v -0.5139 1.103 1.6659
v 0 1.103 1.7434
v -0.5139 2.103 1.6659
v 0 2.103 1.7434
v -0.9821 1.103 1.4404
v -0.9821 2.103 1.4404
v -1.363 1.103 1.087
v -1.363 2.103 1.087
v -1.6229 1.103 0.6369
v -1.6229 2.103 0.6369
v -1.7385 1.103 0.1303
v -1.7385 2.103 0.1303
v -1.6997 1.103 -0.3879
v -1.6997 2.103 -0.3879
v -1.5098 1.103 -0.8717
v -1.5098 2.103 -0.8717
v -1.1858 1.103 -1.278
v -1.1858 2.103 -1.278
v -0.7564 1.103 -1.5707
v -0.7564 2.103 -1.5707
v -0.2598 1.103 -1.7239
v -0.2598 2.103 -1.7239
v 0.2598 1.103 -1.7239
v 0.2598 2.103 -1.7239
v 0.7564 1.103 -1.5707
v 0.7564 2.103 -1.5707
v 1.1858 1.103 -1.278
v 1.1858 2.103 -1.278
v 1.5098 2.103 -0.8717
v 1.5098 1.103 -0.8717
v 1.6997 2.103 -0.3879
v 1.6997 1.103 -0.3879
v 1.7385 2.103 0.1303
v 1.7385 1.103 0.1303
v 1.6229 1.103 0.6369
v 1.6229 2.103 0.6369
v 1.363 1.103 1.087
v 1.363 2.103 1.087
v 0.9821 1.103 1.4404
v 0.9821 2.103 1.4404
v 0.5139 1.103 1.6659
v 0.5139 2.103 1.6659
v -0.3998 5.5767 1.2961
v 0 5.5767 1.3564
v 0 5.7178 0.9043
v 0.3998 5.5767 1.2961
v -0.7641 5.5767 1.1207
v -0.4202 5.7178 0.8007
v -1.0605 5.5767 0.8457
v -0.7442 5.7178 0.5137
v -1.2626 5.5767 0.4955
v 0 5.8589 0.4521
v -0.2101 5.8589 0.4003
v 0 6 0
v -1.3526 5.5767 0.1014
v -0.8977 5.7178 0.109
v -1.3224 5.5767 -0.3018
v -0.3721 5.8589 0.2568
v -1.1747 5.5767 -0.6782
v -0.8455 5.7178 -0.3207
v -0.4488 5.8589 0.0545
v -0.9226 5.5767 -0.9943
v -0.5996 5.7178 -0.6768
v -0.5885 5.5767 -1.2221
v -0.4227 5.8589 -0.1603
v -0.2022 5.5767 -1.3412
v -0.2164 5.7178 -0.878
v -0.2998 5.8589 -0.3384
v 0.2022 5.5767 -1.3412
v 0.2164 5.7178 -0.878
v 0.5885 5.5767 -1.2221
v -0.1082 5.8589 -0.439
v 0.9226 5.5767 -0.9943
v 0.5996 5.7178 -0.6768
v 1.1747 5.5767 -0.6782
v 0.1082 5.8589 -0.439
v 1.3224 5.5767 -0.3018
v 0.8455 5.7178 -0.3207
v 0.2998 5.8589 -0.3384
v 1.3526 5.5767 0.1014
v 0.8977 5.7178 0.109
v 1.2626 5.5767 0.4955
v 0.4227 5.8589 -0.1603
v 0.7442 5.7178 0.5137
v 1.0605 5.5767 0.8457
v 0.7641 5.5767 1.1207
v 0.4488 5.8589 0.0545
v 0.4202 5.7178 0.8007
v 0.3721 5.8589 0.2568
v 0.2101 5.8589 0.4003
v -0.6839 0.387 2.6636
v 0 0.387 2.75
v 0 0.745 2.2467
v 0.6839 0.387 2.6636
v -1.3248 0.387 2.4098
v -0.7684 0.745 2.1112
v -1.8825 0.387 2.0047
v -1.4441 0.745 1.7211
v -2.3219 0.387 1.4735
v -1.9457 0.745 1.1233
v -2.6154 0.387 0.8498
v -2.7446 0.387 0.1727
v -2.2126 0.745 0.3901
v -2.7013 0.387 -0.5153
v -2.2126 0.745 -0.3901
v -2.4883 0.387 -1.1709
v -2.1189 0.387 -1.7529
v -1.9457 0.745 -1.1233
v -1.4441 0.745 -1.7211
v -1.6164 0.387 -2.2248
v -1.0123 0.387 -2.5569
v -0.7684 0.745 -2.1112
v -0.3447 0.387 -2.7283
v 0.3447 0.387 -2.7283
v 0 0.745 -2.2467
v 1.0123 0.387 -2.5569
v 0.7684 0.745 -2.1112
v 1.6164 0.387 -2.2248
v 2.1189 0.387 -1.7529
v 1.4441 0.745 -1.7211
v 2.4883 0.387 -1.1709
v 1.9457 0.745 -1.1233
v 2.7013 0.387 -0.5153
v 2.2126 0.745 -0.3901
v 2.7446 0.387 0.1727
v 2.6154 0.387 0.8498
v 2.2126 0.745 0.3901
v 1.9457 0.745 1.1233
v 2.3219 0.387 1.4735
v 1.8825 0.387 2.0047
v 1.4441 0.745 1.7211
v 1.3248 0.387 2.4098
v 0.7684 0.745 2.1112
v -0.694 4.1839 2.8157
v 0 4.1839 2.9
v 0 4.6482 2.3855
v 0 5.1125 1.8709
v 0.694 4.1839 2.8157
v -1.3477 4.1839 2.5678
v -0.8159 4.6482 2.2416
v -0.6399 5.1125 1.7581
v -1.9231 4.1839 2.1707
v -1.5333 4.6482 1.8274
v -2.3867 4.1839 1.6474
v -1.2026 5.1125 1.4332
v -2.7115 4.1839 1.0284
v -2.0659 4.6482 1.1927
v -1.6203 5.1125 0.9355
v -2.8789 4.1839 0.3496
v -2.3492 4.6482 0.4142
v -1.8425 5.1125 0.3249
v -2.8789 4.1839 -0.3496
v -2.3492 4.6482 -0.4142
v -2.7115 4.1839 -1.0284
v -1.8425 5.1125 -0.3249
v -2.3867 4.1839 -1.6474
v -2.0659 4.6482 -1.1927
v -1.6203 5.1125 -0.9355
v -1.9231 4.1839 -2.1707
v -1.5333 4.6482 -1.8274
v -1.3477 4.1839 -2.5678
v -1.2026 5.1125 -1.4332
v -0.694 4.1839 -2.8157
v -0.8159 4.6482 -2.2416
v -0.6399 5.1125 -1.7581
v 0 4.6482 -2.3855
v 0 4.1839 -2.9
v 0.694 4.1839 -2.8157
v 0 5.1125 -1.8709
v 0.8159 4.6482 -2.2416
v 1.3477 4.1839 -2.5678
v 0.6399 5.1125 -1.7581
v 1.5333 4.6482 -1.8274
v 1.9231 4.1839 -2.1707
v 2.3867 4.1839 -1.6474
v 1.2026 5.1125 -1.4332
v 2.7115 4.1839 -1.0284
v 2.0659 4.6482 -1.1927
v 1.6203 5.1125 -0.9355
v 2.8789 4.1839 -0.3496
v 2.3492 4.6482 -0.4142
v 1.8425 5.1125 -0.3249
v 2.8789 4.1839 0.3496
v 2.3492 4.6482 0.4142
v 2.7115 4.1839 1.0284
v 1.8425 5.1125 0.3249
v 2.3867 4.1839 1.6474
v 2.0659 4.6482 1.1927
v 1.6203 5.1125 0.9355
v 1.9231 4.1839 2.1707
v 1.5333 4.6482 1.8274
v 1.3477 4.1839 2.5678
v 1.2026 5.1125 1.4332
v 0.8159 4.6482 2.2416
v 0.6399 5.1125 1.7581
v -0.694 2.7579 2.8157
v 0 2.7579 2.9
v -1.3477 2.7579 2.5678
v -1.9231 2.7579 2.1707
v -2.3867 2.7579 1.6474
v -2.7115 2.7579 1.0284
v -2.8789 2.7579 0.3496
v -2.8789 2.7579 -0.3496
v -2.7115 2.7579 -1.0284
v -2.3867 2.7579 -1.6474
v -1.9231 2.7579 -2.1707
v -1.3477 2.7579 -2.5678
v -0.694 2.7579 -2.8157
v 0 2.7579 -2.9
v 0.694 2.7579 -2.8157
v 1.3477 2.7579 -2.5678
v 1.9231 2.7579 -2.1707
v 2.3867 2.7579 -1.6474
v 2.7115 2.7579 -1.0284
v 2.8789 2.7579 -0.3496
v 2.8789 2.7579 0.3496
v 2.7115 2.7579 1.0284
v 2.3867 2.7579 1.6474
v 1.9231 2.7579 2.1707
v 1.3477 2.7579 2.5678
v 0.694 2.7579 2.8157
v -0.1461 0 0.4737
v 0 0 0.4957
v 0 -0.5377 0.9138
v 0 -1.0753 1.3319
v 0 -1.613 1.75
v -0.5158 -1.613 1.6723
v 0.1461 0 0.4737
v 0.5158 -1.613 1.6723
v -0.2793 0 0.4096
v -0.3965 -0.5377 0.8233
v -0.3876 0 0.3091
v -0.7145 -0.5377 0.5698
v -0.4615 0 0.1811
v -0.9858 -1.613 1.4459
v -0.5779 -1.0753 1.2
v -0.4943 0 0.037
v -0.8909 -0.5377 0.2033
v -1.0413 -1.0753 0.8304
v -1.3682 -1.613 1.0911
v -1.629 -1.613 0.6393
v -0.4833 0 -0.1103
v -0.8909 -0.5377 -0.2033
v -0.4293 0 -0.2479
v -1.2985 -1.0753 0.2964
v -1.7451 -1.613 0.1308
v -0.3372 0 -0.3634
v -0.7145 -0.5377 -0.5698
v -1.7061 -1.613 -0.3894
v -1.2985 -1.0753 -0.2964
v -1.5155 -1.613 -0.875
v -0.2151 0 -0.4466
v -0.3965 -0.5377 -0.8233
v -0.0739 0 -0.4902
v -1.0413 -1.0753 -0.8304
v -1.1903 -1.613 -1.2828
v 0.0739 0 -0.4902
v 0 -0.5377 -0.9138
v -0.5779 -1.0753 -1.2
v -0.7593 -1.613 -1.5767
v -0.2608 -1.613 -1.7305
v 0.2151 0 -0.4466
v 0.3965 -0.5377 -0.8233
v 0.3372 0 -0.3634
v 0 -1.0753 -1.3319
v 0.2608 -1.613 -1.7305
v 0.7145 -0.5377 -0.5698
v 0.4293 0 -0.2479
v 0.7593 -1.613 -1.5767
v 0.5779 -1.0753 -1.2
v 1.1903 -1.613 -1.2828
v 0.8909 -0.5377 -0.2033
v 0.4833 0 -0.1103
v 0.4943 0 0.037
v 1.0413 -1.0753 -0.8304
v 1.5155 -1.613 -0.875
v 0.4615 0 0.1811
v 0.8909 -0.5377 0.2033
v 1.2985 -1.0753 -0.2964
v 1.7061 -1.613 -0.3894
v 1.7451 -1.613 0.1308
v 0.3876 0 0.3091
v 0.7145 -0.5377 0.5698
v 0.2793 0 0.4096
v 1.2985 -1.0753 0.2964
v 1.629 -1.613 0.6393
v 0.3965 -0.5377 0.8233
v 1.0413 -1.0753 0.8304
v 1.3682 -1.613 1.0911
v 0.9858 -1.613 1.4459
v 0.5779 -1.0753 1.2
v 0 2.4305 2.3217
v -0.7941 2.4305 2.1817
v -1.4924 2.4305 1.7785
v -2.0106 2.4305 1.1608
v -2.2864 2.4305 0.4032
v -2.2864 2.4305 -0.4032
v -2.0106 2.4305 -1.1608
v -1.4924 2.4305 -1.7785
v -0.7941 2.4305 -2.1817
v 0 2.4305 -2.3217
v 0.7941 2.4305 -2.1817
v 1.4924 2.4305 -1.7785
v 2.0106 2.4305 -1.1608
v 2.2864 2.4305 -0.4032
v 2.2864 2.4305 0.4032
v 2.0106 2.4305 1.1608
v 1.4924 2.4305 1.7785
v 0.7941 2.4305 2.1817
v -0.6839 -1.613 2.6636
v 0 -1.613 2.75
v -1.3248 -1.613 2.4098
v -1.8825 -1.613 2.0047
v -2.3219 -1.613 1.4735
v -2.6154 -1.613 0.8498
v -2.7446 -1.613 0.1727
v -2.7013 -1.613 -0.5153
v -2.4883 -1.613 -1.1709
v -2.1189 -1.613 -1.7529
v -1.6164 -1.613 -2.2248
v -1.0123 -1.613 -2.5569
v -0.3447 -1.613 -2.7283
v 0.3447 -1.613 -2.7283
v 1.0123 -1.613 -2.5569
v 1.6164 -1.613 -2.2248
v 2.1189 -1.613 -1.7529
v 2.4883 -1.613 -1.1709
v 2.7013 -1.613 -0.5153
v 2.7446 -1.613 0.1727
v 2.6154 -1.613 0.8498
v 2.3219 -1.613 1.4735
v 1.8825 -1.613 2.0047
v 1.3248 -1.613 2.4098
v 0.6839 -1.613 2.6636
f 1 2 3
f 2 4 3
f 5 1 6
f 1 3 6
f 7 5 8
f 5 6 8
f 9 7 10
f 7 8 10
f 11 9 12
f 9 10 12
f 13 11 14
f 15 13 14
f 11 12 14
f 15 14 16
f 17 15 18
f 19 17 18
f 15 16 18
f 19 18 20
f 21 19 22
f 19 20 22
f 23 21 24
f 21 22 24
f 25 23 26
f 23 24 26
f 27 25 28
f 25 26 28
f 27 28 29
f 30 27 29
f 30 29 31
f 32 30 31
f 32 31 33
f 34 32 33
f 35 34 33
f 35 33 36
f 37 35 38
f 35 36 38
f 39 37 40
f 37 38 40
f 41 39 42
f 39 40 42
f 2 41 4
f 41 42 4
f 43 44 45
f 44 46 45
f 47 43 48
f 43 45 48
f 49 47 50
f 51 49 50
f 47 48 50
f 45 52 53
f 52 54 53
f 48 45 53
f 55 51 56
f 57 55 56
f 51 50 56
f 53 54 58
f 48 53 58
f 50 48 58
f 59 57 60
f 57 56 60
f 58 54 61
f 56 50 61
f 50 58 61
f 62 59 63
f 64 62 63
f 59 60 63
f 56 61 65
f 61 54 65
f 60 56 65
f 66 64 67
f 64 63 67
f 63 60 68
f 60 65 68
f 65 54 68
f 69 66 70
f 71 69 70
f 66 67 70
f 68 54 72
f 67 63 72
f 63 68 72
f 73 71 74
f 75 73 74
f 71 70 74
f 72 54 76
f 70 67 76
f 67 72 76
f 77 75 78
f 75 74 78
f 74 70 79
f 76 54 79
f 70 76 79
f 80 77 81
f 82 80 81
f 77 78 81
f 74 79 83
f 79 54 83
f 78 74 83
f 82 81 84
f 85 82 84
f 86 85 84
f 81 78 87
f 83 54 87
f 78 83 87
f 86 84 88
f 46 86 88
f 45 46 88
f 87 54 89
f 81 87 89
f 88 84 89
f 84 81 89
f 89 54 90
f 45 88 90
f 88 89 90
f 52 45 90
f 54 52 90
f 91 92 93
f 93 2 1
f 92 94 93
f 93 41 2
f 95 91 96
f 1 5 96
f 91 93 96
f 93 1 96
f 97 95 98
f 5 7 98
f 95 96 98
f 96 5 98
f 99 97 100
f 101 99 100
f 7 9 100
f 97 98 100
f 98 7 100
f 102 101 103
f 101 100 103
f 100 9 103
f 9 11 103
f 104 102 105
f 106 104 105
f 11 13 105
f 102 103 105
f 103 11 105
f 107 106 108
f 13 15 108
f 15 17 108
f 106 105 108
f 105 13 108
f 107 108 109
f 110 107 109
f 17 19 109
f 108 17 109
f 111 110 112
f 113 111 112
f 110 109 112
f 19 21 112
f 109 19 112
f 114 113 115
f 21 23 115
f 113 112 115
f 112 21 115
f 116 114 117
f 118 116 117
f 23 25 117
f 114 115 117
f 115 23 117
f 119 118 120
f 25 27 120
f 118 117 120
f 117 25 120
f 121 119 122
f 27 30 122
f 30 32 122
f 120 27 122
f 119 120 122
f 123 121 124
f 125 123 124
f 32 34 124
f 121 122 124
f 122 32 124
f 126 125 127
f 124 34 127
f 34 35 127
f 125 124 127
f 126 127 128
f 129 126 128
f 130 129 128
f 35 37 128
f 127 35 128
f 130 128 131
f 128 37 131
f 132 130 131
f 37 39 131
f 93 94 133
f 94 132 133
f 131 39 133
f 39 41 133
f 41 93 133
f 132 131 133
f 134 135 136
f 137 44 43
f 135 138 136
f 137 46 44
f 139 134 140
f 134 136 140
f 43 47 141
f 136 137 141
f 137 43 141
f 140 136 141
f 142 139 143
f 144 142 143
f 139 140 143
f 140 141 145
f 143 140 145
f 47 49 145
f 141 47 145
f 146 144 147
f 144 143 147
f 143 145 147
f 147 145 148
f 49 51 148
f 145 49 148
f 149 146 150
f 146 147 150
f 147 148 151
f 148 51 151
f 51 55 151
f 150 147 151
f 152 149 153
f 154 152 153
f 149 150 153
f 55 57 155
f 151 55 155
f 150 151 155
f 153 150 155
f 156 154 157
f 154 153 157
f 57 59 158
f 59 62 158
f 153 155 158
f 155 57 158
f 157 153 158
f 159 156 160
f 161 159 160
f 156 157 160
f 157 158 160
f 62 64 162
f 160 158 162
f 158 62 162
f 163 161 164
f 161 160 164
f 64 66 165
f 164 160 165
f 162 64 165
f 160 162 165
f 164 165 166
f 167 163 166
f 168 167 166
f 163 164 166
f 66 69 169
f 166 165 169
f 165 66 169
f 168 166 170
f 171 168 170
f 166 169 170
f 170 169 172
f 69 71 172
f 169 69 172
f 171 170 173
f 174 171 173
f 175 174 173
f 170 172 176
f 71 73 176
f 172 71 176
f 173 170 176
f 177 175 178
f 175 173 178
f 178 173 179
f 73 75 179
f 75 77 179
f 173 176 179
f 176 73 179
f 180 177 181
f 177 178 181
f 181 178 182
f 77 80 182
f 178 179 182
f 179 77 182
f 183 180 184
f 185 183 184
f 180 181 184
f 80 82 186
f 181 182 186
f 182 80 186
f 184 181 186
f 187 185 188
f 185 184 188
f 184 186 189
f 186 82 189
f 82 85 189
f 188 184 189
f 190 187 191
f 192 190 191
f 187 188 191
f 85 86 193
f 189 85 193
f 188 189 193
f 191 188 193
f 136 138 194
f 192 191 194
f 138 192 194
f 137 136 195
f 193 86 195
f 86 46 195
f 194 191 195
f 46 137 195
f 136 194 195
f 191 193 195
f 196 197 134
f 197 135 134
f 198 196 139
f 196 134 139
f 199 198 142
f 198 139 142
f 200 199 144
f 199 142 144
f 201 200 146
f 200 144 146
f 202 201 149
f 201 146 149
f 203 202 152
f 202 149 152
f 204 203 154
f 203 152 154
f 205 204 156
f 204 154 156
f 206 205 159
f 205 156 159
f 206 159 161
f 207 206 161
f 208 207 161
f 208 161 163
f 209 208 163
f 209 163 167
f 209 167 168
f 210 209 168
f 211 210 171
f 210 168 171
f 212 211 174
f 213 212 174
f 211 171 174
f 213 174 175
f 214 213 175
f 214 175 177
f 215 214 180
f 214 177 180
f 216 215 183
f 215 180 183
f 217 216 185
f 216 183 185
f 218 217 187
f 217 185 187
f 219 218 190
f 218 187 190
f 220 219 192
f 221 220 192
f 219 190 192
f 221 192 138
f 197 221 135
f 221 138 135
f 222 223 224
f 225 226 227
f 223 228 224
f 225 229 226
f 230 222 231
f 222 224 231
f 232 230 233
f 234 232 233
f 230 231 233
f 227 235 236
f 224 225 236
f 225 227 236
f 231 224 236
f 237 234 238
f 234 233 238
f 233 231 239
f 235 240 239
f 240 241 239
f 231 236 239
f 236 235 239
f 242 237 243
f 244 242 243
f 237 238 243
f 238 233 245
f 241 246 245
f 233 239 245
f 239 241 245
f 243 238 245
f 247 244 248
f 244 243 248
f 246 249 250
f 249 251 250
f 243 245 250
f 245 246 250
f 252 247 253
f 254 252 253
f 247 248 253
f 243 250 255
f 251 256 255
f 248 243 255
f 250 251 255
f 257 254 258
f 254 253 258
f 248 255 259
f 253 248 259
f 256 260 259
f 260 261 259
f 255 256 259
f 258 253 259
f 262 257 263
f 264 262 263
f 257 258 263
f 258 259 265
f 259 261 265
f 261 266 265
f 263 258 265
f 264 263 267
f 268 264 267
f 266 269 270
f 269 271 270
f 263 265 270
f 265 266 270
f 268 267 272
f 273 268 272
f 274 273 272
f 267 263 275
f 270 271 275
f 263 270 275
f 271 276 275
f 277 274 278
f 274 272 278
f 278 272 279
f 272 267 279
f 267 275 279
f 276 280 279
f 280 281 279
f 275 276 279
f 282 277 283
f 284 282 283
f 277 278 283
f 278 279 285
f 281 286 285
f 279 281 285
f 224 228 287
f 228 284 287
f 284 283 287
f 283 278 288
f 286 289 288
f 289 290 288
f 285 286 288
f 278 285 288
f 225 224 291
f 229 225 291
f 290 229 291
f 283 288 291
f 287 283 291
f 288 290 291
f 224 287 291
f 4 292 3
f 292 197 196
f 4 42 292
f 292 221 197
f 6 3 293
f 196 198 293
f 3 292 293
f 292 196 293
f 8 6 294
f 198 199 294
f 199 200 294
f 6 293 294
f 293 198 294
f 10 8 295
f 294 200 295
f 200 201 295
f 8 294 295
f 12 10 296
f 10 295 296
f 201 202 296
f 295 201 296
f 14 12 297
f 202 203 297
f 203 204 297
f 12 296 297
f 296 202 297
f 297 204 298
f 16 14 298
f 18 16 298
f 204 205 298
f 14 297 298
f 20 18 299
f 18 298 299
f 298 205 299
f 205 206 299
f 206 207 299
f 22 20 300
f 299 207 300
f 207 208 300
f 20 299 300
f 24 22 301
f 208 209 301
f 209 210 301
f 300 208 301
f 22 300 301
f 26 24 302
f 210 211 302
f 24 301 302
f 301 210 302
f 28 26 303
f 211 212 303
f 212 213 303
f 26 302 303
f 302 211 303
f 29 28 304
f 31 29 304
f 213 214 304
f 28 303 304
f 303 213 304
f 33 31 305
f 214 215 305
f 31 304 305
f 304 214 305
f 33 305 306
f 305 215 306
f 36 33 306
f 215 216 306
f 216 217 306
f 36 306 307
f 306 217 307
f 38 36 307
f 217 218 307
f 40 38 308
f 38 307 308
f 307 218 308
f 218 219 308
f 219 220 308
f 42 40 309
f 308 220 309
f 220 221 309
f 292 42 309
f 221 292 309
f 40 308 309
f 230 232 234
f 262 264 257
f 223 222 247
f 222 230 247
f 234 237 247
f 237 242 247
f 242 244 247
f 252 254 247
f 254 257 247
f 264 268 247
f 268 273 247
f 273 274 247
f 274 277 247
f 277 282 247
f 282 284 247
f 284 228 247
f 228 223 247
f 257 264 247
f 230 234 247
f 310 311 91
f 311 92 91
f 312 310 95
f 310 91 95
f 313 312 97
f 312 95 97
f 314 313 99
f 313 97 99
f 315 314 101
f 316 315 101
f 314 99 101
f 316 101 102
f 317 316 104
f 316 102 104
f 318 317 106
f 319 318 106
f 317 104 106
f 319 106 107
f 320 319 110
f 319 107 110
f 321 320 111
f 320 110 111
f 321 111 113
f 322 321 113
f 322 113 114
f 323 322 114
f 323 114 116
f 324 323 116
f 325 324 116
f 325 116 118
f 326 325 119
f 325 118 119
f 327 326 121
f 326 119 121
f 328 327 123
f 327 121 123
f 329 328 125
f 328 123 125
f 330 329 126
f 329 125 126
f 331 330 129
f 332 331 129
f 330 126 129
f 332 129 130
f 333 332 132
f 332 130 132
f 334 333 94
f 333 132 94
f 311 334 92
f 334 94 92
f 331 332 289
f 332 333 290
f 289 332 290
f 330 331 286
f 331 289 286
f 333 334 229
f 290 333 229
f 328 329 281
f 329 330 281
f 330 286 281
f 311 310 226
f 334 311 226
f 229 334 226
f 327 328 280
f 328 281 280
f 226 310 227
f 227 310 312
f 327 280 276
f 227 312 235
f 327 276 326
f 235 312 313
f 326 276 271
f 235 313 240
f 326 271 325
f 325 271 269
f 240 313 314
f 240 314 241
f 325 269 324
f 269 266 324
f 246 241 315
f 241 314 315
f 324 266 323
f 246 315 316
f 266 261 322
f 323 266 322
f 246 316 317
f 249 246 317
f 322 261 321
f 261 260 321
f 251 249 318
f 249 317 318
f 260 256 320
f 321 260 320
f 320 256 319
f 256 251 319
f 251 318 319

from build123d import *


with BuildPart() as part:
    # 스케치1 → 회전1 (revolve)
    with BuildSketch(Plane(origin=(0, 0, 0), x_dir=(0, 0, -1), z_dir=(1, 0, 0)), mode=Mode.PRIVATE) as revolve_1_sk:
        Polygon((0, 0), (0.495725515, 0), (1.75, -1.612980168), (2.75, -1.612980168), (2.75, 0.387019832), (1.743371525, 1.102989251), (1.743371525, 2.102989251), (2.9, 2.757946751), (2.9, 4.183903925), (1.356376494, 5.576732475), (0, 6), align=None)
    revolve(revolve_1_sk.sketch.rotate(Axis((0, 6, 0), (0, -1, 0)), 180), axis=Axis((0, 6, 0), (0, -1, 0)))


solid = part.part
